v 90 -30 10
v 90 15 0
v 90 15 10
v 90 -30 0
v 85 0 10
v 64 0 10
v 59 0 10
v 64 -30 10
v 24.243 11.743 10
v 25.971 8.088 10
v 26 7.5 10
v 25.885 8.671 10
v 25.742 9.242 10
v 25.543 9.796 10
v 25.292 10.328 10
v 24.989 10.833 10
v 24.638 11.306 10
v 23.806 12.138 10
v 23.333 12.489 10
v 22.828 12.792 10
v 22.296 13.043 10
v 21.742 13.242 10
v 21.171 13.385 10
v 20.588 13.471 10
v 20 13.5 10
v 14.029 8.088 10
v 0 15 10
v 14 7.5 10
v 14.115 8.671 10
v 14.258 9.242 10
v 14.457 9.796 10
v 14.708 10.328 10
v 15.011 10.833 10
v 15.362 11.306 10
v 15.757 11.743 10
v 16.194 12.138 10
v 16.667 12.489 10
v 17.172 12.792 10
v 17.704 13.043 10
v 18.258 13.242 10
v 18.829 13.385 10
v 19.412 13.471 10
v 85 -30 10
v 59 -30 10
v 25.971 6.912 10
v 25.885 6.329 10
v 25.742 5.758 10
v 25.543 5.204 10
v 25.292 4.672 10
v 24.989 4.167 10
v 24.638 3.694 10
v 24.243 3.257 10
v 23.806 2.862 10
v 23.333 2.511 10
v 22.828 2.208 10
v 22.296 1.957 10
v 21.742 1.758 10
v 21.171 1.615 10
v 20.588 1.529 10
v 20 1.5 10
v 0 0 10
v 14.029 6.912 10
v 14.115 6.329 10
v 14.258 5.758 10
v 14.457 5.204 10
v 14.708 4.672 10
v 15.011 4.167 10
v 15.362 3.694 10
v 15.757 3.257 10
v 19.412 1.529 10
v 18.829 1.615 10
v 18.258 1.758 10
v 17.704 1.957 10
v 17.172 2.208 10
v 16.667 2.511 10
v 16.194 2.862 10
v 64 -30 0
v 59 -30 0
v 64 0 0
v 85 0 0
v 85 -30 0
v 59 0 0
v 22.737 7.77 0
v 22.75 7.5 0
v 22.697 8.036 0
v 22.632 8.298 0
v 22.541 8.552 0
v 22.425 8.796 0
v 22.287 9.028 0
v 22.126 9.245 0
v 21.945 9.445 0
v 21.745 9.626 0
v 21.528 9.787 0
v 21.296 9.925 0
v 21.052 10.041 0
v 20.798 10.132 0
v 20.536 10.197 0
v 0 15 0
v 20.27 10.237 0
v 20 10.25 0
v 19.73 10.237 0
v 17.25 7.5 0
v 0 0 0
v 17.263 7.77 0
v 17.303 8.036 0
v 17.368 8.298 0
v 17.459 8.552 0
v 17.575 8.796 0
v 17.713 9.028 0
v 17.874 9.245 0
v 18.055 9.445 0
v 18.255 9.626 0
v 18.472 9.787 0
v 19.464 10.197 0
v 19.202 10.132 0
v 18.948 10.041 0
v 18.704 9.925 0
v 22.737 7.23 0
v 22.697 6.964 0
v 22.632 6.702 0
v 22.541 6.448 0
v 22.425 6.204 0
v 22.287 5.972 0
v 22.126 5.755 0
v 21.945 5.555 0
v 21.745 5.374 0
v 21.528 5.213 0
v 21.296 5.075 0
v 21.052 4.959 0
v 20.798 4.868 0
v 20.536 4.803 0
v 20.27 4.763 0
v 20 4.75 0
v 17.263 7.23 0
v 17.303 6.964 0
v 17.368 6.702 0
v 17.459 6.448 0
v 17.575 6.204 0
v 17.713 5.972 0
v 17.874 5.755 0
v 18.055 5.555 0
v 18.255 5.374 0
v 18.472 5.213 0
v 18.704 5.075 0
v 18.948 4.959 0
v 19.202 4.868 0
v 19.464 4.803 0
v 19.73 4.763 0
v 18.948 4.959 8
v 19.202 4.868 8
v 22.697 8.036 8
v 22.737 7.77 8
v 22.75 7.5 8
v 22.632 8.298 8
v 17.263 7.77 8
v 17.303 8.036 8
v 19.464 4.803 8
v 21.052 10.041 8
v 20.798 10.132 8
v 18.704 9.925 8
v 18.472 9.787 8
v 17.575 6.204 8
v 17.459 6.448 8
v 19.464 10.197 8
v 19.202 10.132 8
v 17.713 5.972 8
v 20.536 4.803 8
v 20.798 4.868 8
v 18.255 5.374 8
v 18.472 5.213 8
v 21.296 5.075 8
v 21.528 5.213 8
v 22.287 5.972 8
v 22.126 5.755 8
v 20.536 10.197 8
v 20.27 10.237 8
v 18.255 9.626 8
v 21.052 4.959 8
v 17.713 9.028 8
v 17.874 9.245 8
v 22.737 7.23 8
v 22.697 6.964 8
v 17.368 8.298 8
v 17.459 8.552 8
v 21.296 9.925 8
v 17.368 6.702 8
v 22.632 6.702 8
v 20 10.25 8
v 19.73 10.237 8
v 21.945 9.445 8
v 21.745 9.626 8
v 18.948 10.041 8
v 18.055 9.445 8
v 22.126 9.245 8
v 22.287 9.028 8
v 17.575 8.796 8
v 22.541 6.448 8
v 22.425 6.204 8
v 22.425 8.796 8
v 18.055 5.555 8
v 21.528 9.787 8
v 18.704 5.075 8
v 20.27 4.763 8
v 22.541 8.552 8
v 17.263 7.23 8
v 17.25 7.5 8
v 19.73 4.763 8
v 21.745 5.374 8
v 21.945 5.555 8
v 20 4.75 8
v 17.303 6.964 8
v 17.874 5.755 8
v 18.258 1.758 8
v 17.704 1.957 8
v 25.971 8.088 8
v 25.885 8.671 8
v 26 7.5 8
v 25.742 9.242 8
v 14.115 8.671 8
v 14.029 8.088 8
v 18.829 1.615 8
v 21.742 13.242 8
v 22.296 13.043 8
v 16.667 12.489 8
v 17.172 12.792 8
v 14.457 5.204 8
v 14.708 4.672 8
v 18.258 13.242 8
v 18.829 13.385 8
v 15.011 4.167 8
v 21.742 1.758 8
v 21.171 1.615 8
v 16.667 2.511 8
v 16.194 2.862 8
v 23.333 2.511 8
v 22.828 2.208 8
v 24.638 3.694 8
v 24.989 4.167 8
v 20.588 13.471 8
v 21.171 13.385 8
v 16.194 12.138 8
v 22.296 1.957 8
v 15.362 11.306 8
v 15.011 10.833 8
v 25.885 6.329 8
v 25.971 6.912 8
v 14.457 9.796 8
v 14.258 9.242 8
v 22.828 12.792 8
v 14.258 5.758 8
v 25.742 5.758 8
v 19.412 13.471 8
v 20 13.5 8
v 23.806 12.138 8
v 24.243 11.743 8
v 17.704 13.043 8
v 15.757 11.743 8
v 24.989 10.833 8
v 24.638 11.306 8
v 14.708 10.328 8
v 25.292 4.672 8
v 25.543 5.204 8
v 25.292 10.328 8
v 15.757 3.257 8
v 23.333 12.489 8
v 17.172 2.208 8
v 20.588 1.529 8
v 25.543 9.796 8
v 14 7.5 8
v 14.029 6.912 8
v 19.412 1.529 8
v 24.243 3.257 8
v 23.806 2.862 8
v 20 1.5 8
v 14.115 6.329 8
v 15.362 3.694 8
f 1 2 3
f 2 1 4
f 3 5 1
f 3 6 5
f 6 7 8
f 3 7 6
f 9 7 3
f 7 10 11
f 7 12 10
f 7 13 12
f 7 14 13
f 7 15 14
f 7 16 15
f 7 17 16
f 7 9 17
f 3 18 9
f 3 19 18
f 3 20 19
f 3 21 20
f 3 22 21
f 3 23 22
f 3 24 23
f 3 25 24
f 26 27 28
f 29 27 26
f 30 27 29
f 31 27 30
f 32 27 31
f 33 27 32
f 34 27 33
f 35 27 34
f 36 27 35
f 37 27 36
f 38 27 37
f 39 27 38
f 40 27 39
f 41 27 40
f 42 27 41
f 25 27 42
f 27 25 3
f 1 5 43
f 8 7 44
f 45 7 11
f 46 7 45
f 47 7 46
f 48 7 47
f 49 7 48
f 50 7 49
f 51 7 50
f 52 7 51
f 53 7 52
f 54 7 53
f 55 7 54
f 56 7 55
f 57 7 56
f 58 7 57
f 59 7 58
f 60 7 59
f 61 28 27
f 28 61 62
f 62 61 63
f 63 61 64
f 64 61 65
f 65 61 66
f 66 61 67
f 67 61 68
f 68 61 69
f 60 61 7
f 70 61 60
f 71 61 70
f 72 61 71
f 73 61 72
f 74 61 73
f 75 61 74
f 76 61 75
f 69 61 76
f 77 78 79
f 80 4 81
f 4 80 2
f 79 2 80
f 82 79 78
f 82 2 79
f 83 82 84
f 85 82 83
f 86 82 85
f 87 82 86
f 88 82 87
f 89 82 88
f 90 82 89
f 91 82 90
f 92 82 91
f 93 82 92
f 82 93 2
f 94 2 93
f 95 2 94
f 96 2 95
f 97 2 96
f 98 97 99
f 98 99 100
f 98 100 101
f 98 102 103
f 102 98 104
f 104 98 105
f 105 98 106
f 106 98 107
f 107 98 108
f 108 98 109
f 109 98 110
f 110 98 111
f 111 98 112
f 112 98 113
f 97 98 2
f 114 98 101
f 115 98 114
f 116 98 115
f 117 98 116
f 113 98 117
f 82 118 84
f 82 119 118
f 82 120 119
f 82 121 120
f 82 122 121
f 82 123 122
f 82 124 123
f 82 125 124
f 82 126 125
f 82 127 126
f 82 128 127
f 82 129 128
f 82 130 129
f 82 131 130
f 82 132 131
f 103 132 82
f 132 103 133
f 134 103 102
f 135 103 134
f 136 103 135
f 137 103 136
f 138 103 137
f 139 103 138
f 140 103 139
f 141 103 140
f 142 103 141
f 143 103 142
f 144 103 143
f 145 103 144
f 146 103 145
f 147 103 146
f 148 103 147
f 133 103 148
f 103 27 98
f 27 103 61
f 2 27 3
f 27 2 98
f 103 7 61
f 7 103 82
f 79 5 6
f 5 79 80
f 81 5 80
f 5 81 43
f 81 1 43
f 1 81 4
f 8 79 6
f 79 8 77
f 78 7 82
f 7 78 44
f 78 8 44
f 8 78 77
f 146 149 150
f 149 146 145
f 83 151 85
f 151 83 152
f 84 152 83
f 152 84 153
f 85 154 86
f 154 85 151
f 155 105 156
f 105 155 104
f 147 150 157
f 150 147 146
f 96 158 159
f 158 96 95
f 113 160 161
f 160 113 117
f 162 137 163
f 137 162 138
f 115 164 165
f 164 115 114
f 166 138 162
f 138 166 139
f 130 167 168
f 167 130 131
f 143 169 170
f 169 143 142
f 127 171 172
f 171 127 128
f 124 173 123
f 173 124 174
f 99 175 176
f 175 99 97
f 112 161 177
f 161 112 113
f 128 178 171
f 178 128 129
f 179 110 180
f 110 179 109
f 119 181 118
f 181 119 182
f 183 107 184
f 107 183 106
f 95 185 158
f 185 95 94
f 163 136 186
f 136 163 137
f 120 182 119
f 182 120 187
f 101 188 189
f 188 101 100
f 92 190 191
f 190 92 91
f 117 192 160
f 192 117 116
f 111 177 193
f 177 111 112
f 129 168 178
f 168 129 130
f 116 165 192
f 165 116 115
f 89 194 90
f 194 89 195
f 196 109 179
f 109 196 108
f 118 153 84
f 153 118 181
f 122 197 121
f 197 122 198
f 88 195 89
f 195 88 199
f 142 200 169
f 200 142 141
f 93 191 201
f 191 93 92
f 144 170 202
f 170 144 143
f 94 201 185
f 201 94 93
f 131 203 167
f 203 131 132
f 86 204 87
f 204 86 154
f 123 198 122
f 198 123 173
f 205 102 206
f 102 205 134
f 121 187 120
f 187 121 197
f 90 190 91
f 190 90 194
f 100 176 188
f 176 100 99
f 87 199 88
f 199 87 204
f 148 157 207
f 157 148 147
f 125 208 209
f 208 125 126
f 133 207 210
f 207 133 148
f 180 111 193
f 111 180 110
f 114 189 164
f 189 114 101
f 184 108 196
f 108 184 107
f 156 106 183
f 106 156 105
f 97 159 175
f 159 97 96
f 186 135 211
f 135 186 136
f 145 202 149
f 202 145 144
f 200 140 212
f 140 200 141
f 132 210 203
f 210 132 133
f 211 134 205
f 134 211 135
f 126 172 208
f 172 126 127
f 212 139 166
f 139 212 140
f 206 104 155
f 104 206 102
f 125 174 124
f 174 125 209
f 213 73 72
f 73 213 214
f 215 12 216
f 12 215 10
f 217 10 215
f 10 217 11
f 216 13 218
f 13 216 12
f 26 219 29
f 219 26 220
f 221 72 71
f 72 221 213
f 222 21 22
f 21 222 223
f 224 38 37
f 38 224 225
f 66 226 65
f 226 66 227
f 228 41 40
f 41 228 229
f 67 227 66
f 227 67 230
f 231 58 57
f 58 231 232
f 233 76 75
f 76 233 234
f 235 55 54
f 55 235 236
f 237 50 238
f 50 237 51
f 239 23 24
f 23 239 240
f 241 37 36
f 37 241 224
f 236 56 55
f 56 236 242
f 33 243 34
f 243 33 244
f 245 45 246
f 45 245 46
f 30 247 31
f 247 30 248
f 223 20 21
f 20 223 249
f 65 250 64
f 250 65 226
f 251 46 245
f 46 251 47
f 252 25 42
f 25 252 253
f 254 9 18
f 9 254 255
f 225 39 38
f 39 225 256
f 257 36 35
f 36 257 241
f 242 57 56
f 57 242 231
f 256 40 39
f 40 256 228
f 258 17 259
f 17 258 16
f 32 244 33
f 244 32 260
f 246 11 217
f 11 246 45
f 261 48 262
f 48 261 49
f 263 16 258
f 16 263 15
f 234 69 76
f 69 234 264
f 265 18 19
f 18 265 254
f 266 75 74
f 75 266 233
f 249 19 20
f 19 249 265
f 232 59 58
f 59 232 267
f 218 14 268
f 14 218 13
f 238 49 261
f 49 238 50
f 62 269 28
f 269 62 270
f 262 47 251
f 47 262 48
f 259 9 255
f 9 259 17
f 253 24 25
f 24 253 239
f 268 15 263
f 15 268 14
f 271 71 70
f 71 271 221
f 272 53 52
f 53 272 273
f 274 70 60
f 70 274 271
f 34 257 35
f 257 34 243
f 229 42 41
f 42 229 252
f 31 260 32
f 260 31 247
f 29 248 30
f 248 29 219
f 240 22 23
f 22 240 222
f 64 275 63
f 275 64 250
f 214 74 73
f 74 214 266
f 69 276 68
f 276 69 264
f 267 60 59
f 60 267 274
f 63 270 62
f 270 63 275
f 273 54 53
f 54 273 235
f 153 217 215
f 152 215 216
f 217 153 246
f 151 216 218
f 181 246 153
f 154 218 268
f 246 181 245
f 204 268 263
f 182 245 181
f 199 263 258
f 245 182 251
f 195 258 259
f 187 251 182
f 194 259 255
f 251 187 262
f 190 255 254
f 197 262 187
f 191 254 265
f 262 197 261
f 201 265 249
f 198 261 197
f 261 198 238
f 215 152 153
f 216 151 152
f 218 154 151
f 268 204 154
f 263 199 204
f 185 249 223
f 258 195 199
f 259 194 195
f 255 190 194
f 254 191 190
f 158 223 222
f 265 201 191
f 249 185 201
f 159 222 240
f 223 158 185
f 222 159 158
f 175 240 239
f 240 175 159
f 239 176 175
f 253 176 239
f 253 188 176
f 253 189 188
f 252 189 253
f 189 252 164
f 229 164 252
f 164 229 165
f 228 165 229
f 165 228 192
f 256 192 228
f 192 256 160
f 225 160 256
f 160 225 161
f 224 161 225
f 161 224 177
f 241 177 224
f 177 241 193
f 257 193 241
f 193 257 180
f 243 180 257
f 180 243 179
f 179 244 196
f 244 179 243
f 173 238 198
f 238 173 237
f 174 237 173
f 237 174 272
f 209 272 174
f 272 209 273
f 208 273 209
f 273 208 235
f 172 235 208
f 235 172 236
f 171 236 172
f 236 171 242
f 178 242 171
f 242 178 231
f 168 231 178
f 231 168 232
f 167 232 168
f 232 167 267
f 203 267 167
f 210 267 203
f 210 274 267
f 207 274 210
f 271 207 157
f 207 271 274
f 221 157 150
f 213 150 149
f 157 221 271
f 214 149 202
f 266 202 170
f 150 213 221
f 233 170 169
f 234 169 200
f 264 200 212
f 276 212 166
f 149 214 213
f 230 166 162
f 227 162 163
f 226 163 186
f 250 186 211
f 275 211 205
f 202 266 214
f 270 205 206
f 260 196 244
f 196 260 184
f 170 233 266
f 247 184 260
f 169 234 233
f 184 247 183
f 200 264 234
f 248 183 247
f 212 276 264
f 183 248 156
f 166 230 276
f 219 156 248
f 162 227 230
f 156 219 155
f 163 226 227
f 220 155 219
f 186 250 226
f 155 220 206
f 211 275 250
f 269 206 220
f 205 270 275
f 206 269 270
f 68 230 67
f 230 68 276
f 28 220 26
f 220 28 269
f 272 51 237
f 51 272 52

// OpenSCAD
// file: _adjustable_bracket.scad
// =====================================
// Adjustable Bracket
// Two interlocking pieces with bolt adjustment
// =====================================
// One end has a rounded head to rest against a wall.
// The other end has a U-channel bracket that hooks over
// something below it (21mm gap along bar, 30mm deep down).
// The two pieces bolt together through a slot, making
// the total span adjustable (centre: 140mm).
//
// Measurements (from sketch):
//   Total span (adjustable): ~125-155mm (centre 140mm)
//   Bracket gap: 21mm (along bar axis)
//   Bracket depth: 30mm (downward)
//   Thickness: 10mm (1cm)
//   Bolt: M5 with nut and washers

$fn = 64;

// === Parameters (mm) ===
thickness       = 10;       // 1cm depth
bar_width       = 15;       // width of the overlap bar
bracket_gap     = 21;       // internal gap of bracket channel (along bar axis)
bracket_depth   = 30;       // bracket depth downward from bar
wall_t          = 5;        // bracket wall thickness
head_diameter   = 30;       // rounded wall-rest head diameter

// Bolt / slot
slot_length     = 30;       // adjustment slot length (~±15mm range)
bolt_clearance  = 5.5;      // M5 bolt clearance hole
washer_dia      = 12;       // washer recess diameter
washer_depth    = 2;        // washer recess depth

// Layout
total_span      = 140;      // centre of adjustment range
overlap         = 40;       // bar overlap at centre position

// Derived
piece_length    = (total_span + overlap) / 2;  // 90mm each

// === Piece A: Wall piece with rounded head ===
module piece_a() {
    difference() {
        union() {
            // Main bar
            cube([piece_length, bar_width, thickness]);

            // Rounded head at x=0 (wider than bar, for wall contact)
            translate([0, bar_width/2, 0])
                cylinder(d = head_diameter, h = thickness);
        }

        // Adjustment slot (in the overlap zone)
        slot_x = piece_length - overlap + 5;
        translate([slot_x, bar_width/2, -0.1])
            hull() {
                cylinder(d = bolt_clearance, h = thickness + 0.2);
                translate([slot_length, 0, 0])
                    cylinder(d = bolt_clearance, h = thickness + 0.2);
            }

        // Washer recess on bottom (nut side when assembled)
        translate([slot_x, bar_width/2, -0.1])
            hull() {
                cylinder(d = washer_dia, h = washer_depth + 0.1);
                translate([slot_length, 0, 0])
                    cylinder(d = washer_dia, h = washer_depth + 0.1);
            }
    }
}

// === Piece B: Bracket piece ===
// Bracket is a U-channel at the bar end, opening downward.
// Two walls drop down from the bar with a 21mm gap between them,
// connected at the bottom. Hooks over a rail/shelf edge from above.
module piece_b() {
    bracket_start_x = piece_length - 2*wall_t - bracket_gap;

    difference() {
        union() {
            // Main bar
            cube([piece_length, bar_width, thickness]);

            // Outer wall (at bar end)
            translate([piece_length - wall_t, -bracket_depth, 0])
                cube([wall_t, bracket_depth, thickness]);

            // Inner wall (bracket_gap away from outer wall)
            translate([bracket_start_x, -bracket_depth, 0])
                cube([wall_t, bracket_depth, thickness]);


        }

        // Bolt hole (round - the slot is on piece A)
        translate([overlap/2, bar_width/2, -0.1])
            cylinder(d = bolt_clearance, h = thickness + 0.2);

        // Washer recess on top (bolt head side when assembled)
        translate([overlap/2, bar_width/2, thickness - washer_depth])
            cylinder(d = washer_dia, h = washer_depth + 0.1);
    }
}

// === Assembly view ===
// This file is a shared library. Render individual pieces via:
//   piece_a.scad  ->  piece_a.stl
//   piece_b.scad  ->  piece_b.stl
// main file
// Adjustable Bracket - Piece B (bracket piece with U-channel)
// Render this file to generate piece_b.stl

include <_adjustable_bracket.scad>

piece_b();
